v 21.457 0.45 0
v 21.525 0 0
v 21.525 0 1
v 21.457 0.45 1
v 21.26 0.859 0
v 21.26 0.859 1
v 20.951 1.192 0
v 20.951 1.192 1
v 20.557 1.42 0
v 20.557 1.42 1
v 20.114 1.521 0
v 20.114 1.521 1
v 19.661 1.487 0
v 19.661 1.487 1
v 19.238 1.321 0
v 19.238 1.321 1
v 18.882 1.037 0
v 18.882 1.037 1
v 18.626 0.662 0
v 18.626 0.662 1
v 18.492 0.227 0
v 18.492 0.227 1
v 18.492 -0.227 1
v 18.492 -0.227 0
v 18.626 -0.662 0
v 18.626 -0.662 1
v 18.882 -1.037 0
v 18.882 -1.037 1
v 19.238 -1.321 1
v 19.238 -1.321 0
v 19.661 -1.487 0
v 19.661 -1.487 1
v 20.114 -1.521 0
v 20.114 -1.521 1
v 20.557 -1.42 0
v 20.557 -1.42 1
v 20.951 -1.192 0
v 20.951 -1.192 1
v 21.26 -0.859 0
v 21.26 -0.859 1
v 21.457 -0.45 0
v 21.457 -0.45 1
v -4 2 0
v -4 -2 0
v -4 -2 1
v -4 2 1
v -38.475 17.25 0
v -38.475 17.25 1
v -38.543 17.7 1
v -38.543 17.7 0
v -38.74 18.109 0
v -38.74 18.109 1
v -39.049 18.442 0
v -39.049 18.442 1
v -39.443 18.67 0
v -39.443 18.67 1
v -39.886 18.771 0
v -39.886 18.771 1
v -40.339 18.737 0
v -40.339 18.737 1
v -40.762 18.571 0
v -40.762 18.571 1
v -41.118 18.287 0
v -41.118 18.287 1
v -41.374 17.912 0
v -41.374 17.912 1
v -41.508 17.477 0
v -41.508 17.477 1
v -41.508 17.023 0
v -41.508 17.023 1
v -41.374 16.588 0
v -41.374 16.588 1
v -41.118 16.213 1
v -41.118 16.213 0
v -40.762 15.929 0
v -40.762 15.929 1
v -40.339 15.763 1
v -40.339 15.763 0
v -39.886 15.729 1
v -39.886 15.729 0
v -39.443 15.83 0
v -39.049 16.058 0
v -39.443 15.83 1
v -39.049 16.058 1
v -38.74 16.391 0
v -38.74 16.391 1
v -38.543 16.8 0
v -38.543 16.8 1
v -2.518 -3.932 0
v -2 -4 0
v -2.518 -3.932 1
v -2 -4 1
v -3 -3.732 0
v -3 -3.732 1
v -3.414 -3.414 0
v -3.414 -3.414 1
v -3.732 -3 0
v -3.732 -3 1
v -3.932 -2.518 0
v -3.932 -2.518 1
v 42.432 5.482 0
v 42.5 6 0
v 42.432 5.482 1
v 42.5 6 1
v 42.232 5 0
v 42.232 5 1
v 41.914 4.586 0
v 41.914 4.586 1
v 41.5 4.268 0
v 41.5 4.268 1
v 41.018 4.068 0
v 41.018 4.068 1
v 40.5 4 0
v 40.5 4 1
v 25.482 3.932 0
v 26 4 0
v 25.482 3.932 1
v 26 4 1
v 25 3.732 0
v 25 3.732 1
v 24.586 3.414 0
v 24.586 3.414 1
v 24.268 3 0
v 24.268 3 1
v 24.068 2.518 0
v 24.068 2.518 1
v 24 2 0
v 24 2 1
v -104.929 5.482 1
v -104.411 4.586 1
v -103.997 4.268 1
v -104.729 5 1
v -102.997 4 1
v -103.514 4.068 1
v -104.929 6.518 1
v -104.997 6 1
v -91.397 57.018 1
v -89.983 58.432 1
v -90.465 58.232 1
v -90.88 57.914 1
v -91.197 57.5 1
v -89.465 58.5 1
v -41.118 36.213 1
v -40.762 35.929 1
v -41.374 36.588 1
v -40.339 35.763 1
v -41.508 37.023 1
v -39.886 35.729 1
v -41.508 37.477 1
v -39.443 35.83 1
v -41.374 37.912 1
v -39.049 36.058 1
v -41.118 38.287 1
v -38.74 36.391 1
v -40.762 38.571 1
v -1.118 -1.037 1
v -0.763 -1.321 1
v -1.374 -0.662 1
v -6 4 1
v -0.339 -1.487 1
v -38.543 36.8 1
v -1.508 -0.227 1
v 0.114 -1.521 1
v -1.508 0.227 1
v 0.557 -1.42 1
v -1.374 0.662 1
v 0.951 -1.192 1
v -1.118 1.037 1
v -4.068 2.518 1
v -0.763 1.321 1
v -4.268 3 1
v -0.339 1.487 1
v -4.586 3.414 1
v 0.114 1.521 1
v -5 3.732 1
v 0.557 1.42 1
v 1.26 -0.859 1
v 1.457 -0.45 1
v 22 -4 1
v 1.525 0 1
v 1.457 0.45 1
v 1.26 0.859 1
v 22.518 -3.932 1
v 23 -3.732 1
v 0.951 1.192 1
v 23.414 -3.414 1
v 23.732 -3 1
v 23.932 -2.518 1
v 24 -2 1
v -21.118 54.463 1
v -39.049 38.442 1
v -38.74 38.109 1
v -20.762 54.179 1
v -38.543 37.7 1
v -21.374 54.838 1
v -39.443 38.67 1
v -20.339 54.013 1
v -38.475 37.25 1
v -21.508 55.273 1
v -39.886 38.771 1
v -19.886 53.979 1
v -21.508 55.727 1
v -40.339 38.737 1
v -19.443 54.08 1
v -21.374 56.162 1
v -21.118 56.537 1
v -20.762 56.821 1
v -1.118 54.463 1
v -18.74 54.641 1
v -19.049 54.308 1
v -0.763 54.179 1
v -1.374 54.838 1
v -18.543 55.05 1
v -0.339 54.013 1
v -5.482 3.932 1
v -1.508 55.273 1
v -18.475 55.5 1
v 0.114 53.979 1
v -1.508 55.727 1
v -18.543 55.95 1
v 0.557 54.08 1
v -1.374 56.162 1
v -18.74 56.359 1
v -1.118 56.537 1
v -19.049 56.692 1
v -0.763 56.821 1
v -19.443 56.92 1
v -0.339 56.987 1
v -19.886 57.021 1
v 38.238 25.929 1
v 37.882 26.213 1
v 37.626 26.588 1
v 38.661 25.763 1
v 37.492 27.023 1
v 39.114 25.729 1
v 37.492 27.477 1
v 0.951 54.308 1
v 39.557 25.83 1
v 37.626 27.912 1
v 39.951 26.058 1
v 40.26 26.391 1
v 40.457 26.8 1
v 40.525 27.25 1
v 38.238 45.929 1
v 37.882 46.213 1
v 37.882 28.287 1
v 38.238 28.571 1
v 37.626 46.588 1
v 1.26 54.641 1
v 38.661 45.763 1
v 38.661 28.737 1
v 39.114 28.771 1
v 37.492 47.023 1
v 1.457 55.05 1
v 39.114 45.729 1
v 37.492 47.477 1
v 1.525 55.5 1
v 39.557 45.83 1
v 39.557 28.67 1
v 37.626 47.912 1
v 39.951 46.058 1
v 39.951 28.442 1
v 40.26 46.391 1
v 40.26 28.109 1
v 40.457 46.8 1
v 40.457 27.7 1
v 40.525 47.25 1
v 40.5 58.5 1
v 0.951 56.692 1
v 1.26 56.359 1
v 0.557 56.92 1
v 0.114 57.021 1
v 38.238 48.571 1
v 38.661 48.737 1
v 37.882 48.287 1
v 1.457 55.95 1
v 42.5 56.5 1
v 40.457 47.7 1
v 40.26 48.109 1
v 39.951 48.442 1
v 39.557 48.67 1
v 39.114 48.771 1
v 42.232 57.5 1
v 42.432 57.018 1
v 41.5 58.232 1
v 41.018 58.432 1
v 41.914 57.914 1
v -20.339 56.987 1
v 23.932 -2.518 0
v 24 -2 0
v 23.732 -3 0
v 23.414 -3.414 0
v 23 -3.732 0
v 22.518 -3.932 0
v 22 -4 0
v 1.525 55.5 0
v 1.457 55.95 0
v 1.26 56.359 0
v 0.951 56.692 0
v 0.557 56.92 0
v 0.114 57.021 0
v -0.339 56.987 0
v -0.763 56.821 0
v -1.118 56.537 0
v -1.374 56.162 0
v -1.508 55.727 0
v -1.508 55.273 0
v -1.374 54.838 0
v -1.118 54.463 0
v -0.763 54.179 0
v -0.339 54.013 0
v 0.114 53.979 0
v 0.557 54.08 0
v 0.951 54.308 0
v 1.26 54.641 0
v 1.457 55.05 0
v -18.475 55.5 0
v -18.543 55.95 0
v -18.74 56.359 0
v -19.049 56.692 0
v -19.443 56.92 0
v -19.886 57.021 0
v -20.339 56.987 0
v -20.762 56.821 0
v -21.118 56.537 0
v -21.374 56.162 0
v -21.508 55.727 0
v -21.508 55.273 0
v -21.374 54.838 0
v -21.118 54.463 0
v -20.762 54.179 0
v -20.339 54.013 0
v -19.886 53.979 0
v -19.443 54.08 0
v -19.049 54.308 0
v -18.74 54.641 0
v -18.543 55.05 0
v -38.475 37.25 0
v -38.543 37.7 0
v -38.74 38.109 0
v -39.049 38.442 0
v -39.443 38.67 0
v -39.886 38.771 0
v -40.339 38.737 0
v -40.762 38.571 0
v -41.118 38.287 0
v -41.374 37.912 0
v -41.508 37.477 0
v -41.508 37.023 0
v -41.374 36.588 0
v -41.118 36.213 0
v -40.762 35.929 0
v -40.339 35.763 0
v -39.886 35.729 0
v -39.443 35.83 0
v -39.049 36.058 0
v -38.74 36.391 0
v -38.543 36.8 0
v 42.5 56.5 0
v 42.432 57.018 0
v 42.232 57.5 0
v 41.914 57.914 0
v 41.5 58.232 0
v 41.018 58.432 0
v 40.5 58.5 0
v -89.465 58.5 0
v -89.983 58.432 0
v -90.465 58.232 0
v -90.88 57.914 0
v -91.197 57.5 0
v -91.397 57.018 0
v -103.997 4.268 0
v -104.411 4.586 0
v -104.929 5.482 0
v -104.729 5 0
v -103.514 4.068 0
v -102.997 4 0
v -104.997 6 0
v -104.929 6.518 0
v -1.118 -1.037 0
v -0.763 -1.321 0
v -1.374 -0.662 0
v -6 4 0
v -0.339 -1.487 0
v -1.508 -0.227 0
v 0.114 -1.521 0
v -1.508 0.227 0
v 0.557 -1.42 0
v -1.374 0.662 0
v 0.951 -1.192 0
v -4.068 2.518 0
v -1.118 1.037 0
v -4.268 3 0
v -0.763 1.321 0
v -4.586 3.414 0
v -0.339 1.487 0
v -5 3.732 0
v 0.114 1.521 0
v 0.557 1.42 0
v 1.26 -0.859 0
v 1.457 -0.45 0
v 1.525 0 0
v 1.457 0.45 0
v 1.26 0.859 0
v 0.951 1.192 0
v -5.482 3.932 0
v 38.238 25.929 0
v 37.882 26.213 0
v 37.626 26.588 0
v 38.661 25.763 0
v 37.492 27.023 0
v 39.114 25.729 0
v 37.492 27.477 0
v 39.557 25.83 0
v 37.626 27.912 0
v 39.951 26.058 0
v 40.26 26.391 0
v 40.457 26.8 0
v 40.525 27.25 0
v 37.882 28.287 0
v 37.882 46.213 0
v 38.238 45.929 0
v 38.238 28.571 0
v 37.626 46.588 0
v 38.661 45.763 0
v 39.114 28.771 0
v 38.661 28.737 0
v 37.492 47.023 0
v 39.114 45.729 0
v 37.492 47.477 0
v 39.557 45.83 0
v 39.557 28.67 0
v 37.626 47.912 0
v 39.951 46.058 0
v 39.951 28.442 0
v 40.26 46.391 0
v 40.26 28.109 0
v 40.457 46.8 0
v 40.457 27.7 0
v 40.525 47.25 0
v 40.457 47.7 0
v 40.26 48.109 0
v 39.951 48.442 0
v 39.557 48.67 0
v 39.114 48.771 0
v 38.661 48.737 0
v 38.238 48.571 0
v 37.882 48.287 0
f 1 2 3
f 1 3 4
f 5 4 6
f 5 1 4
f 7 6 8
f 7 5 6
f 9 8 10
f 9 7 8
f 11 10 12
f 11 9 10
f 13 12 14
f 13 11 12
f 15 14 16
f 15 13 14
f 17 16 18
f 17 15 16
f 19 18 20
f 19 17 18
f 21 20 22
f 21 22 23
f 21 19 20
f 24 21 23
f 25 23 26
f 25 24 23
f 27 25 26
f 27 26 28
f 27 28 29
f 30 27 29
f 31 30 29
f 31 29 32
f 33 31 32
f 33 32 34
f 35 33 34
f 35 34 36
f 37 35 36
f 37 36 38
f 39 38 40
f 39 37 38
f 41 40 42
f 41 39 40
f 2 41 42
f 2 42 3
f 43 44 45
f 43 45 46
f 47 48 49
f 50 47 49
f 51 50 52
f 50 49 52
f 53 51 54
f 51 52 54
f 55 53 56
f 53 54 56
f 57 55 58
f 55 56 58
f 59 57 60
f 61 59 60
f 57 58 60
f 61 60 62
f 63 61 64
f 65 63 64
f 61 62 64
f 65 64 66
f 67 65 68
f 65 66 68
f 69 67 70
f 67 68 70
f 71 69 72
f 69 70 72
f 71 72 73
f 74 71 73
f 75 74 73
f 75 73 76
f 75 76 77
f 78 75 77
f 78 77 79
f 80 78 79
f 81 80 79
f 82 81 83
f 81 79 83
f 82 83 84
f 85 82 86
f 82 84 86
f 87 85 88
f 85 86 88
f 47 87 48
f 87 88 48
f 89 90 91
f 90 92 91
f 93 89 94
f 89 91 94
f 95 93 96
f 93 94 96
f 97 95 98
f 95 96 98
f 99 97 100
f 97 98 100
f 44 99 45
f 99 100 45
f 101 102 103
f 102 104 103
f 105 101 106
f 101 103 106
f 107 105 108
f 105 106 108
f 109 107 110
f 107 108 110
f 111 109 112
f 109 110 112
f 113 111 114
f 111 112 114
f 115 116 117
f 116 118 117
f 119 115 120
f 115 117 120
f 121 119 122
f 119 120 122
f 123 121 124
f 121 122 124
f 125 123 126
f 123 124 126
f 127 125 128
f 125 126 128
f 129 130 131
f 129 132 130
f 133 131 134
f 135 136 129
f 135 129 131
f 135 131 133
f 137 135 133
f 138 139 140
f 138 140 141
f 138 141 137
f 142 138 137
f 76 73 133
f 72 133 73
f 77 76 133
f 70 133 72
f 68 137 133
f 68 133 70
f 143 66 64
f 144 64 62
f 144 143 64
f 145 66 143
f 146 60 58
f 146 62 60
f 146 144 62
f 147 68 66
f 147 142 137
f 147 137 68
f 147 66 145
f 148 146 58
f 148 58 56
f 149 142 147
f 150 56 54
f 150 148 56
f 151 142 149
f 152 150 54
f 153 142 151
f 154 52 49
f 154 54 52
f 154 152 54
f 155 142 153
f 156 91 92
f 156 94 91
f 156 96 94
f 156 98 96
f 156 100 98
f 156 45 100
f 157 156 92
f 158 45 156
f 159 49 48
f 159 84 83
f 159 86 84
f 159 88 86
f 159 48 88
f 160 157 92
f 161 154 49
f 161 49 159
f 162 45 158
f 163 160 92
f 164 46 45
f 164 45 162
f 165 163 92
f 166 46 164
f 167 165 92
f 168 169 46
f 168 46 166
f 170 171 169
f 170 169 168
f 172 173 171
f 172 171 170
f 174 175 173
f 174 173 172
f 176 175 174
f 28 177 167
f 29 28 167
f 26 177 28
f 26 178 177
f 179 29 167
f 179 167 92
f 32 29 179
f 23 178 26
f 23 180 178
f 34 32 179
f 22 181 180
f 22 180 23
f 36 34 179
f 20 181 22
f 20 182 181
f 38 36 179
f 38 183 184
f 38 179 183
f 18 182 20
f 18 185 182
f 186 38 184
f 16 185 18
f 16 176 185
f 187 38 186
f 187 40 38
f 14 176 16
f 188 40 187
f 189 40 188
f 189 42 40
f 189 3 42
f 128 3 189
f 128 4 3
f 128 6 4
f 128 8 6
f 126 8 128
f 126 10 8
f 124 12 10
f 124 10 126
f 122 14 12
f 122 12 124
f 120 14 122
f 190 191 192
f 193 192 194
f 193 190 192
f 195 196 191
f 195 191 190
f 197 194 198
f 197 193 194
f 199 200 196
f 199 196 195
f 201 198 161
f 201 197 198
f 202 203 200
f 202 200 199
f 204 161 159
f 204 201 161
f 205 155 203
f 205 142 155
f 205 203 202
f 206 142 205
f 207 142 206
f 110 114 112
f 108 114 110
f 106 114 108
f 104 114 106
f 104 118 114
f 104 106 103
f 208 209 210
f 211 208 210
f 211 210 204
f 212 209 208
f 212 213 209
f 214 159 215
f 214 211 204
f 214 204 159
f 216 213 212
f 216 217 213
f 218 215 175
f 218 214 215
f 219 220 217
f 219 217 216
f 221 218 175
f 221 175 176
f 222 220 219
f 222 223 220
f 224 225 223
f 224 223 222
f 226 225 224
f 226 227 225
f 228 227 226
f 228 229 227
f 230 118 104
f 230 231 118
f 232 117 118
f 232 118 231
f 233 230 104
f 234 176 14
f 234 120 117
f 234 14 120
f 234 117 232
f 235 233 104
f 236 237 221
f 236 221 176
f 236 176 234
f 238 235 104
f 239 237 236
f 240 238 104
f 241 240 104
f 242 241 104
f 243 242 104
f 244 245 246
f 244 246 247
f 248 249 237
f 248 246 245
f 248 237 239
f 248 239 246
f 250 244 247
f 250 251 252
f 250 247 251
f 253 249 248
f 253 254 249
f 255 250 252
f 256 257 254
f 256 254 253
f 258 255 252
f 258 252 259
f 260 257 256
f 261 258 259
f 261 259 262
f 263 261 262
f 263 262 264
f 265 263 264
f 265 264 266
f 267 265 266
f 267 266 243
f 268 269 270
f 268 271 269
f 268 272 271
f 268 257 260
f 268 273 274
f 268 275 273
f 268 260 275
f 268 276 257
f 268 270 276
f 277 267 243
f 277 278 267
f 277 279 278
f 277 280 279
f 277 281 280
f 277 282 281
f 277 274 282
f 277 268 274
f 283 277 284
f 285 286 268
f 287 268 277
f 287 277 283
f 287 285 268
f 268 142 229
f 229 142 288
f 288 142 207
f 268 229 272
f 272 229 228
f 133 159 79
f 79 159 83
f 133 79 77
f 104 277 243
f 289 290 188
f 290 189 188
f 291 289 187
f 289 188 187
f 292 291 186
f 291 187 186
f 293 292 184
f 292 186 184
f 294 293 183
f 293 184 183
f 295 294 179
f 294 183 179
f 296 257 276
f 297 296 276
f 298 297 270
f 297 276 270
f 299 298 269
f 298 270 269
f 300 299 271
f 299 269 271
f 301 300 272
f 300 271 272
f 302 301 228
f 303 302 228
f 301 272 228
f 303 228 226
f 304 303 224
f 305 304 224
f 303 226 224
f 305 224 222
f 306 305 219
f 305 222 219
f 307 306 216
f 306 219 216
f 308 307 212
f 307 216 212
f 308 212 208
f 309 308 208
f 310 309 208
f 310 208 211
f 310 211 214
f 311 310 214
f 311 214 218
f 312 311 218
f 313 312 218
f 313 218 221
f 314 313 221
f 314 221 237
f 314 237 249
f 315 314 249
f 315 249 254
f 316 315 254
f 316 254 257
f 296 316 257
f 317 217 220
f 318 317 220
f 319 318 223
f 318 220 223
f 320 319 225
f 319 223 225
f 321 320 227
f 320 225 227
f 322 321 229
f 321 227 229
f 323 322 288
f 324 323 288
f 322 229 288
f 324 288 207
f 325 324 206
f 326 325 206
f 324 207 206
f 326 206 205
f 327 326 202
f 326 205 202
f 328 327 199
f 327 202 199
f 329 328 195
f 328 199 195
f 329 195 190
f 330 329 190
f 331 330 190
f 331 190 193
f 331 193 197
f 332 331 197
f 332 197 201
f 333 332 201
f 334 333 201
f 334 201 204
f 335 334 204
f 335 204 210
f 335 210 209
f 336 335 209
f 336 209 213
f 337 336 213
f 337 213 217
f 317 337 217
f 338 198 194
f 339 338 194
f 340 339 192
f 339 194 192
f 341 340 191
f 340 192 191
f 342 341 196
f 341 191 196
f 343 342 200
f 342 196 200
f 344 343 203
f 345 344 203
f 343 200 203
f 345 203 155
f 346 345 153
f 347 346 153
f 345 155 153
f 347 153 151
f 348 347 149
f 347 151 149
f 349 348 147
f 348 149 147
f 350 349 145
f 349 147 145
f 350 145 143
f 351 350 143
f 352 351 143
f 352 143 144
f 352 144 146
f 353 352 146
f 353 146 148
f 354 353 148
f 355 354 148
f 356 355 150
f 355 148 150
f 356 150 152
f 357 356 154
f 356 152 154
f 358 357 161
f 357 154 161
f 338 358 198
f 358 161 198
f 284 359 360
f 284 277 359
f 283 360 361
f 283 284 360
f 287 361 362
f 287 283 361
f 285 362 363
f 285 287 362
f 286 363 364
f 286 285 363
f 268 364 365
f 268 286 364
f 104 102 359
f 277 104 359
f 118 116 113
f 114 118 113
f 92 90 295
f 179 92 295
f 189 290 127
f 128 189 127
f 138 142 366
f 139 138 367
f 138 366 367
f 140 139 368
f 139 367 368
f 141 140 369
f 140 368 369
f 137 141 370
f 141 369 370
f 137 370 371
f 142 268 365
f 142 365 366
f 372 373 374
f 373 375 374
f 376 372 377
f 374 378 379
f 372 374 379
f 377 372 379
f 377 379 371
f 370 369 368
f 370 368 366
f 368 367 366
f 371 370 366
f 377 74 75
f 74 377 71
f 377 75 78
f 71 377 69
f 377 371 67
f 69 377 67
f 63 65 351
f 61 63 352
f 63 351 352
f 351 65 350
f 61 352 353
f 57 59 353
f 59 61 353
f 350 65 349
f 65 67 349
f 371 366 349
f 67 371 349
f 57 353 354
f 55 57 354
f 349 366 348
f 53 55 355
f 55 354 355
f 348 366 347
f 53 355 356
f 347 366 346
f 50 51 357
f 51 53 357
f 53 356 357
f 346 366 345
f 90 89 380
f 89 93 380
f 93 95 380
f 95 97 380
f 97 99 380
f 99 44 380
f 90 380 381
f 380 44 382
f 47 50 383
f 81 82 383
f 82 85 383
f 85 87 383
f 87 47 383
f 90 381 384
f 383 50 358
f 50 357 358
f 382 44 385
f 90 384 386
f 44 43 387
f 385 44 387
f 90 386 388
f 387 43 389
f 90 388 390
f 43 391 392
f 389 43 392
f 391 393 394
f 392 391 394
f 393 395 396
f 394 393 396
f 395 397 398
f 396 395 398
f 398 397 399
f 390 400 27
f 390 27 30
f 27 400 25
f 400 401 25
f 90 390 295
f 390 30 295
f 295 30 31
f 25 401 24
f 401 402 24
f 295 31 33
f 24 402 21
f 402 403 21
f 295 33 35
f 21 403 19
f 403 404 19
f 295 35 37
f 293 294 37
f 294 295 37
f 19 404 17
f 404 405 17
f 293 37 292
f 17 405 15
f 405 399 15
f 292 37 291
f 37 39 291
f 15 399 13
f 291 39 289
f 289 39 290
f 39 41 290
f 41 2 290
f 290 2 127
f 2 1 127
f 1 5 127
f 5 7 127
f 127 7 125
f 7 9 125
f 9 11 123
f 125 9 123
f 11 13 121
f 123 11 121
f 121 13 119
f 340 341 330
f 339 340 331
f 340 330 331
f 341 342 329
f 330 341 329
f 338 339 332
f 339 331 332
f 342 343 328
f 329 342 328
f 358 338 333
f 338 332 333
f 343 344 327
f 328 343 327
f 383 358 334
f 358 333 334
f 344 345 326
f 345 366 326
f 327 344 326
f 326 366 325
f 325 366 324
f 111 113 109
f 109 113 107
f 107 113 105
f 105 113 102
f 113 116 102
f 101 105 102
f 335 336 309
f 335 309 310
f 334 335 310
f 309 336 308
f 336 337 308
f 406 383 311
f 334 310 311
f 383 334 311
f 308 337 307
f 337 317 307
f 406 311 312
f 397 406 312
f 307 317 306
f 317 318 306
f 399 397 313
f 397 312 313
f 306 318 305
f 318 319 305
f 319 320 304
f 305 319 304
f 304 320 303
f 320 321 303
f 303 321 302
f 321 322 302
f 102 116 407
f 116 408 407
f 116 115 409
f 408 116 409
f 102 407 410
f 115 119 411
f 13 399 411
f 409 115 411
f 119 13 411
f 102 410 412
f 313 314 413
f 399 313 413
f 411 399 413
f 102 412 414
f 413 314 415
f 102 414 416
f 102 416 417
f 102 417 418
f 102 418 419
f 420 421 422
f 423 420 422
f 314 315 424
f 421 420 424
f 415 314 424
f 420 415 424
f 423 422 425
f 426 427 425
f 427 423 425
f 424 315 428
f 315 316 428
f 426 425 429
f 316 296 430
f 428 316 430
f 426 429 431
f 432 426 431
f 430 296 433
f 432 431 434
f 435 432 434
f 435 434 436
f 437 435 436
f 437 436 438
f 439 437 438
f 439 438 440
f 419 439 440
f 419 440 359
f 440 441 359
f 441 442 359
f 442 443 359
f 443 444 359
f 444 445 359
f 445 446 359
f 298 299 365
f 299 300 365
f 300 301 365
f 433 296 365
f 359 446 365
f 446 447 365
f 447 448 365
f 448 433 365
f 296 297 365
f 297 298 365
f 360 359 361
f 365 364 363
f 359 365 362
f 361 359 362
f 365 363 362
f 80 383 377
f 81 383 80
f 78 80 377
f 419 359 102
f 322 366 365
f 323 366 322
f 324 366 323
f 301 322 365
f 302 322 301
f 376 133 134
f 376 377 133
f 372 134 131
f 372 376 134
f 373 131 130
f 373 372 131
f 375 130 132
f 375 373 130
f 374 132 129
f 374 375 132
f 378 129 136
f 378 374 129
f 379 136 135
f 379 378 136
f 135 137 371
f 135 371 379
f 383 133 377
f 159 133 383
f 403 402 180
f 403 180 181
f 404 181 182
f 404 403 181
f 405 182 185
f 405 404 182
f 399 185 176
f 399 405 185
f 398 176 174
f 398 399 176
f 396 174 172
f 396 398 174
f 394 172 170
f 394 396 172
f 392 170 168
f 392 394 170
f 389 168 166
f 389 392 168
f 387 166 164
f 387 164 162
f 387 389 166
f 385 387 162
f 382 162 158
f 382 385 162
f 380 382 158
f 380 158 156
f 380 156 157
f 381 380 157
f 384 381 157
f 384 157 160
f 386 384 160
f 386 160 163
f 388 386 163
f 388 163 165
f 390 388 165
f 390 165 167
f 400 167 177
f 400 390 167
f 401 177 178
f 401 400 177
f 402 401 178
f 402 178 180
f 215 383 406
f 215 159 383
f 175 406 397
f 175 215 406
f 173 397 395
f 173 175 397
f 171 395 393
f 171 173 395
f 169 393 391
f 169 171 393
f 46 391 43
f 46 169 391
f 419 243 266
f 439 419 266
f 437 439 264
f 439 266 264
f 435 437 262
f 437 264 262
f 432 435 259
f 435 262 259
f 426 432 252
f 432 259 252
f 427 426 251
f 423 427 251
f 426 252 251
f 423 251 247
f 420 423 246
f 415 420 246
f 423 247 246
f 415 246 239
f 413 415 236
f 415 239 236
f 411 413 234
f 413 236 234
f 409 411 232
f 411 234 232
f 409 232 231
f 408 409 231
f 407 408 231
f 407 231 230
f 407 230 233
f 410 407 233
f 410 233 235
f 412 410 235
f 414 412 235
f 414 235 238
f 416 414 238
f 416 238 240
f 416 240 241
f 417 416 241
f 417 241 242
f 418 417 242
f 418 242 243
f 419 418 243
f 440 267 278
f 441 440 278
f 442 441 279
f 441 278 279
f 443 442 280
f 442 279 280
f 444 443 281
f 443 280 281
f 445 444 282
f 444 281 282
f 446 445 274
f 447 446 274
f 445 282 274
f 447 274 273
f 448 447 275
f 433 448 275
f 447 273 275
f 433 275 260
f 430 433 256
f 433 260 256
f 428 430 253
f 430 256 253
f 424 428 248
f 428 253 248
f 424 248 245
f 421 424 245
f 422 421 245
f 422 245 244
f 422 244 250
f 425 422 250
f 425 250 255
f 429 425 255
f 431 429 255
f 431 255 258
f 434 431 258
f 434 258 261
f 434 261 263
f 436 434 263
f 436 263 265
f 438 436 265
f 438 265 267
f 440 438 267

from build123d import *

# Parameters (mm, degrees)
SKETCH_1_W          = 28
SKETCH_1_H          = 8
SKETCH_1_R          = 1.525
EXTRUDE_1_DEPTH     = 1
SKETCH_2_R          = 1.525
CUT_EXTRUDE_1_DEPTH = 1
FILLET_1_R          = 2
SKETCH_3_R          = 1.525
CUT_EXTRUDE_2_DEPTH = 10
SKETCH_4_R          = 1.525
CUT_EXTRUDE_3_DEPTH = 10
EXTRUDE_2_DEPTH     = 1
FILLET_2_R          = 2


with BuildPart() as part:
    # 草图1 → 凸台-拉伸1 (new body)
    with BuildSketch(Plane.XY):
        Polygon((-4, 4), (24, 4), (42.5, 4), (42.5, 58.5), (-45, 58.5), (-45, 4), align=None)
        with Locations((10, 0)):
            Rectangle(SKETCH_1_W, SKETCH_1_H)
        with Locations((20, 0)):
            Circle(SKETCH_1_R, mode=Mode.SUBTRACT)
        Circle(SKETCH_1_R, mode=Mode.SUBTRACT)
    extrude(amount=EXTRUDE_1_DEPTH)

    # 草图2 → 切除-拉伸1 (cut)
    with BuildSketch(Plane.XY.offset(1)):
        with Locations((-40, 37.25)):
            Circle(SKETCH_2_R)
        with Locations((-40, 17.25)):
            Circle(SKETCH_2_R)
    extrude(amount=-CUT_EXTRUDE_1_DEPTH, mode=Mode.SUBTRACT)

    # 圆角1
    fillet_1_edges = [part.edges().sort_by_distance(p)[0] for p in [
        (42.5, 4, 0.5),
        (24, 4, 0.5),
        (24, -4, 0.5),
        (-4, -4, 0.5),
        (-4, 4, 0.5),
        (-45, 4, 0.5),
        (-45, 58.5, 0.5),
        (42.5, 58.5, 0.5),
    ]]
    fillet(fillet_1_edges, radius=FILLET_1_R)

    # 草图3 → 切除-拉伸2 (cut)
    with BuildSketch(Plane.XY.offset(1)):
        with Locations((39, 47.25)):
            Circle(SKETCH_3_R)
        with Locations((39, 27.25)):
            Circle(SKETCH_3_R)
    extrude(amount=-CUT_EXTRUDE_2_DEPTH, mode=Mode.SUBTRACT)

    # 草图4 → 切除-拉伸3 (cut)
    with BuildSketch(Plane.XY.offset(1)):
        with Locations((-20, 55.5)):
            Circle(SKETCH_4_R)
        with Locations((0, 55.5)):
            Circle(SKETCH_4_R)
    extrude(amount=-CUT_EXTRUDE_3_DEPTH, mode=Mode.SUBTRACT)

    # 草图5 → 凸台-拉伸2 (add)
    with BuildSketch(Plane.XY.offset(1)):
        with BuildLine():
            ThreePointArc((-45, 56.5), (-44.414213562, 57.914213562), (-43, 58.5))
            Line((-43, 58.5), (-91, 58.5))
            Line((-91, 58.5), (-105.603230987, 4))
            Line((-105.603230987, 4), (-43, 4))
            ThreePointArc((-43, 4), (-44.414213562, 4.585786438), (-45, 6))
            Line((-45, 6), (-45, 56.5))
        make_face()
    extrude(amount=-EXTRUDE_2_DEPTH)

    # 圆角2
    fillet_2_edges = [part.edges().sort_by_distance(p)[0] for p in [
        (-91, 58.5, 0.5),
        (-105.603230987, 4, 0.5),
    ]]
    fillet(fillet_2_edges, radius=FILLET_2_R)


solid = part.part
